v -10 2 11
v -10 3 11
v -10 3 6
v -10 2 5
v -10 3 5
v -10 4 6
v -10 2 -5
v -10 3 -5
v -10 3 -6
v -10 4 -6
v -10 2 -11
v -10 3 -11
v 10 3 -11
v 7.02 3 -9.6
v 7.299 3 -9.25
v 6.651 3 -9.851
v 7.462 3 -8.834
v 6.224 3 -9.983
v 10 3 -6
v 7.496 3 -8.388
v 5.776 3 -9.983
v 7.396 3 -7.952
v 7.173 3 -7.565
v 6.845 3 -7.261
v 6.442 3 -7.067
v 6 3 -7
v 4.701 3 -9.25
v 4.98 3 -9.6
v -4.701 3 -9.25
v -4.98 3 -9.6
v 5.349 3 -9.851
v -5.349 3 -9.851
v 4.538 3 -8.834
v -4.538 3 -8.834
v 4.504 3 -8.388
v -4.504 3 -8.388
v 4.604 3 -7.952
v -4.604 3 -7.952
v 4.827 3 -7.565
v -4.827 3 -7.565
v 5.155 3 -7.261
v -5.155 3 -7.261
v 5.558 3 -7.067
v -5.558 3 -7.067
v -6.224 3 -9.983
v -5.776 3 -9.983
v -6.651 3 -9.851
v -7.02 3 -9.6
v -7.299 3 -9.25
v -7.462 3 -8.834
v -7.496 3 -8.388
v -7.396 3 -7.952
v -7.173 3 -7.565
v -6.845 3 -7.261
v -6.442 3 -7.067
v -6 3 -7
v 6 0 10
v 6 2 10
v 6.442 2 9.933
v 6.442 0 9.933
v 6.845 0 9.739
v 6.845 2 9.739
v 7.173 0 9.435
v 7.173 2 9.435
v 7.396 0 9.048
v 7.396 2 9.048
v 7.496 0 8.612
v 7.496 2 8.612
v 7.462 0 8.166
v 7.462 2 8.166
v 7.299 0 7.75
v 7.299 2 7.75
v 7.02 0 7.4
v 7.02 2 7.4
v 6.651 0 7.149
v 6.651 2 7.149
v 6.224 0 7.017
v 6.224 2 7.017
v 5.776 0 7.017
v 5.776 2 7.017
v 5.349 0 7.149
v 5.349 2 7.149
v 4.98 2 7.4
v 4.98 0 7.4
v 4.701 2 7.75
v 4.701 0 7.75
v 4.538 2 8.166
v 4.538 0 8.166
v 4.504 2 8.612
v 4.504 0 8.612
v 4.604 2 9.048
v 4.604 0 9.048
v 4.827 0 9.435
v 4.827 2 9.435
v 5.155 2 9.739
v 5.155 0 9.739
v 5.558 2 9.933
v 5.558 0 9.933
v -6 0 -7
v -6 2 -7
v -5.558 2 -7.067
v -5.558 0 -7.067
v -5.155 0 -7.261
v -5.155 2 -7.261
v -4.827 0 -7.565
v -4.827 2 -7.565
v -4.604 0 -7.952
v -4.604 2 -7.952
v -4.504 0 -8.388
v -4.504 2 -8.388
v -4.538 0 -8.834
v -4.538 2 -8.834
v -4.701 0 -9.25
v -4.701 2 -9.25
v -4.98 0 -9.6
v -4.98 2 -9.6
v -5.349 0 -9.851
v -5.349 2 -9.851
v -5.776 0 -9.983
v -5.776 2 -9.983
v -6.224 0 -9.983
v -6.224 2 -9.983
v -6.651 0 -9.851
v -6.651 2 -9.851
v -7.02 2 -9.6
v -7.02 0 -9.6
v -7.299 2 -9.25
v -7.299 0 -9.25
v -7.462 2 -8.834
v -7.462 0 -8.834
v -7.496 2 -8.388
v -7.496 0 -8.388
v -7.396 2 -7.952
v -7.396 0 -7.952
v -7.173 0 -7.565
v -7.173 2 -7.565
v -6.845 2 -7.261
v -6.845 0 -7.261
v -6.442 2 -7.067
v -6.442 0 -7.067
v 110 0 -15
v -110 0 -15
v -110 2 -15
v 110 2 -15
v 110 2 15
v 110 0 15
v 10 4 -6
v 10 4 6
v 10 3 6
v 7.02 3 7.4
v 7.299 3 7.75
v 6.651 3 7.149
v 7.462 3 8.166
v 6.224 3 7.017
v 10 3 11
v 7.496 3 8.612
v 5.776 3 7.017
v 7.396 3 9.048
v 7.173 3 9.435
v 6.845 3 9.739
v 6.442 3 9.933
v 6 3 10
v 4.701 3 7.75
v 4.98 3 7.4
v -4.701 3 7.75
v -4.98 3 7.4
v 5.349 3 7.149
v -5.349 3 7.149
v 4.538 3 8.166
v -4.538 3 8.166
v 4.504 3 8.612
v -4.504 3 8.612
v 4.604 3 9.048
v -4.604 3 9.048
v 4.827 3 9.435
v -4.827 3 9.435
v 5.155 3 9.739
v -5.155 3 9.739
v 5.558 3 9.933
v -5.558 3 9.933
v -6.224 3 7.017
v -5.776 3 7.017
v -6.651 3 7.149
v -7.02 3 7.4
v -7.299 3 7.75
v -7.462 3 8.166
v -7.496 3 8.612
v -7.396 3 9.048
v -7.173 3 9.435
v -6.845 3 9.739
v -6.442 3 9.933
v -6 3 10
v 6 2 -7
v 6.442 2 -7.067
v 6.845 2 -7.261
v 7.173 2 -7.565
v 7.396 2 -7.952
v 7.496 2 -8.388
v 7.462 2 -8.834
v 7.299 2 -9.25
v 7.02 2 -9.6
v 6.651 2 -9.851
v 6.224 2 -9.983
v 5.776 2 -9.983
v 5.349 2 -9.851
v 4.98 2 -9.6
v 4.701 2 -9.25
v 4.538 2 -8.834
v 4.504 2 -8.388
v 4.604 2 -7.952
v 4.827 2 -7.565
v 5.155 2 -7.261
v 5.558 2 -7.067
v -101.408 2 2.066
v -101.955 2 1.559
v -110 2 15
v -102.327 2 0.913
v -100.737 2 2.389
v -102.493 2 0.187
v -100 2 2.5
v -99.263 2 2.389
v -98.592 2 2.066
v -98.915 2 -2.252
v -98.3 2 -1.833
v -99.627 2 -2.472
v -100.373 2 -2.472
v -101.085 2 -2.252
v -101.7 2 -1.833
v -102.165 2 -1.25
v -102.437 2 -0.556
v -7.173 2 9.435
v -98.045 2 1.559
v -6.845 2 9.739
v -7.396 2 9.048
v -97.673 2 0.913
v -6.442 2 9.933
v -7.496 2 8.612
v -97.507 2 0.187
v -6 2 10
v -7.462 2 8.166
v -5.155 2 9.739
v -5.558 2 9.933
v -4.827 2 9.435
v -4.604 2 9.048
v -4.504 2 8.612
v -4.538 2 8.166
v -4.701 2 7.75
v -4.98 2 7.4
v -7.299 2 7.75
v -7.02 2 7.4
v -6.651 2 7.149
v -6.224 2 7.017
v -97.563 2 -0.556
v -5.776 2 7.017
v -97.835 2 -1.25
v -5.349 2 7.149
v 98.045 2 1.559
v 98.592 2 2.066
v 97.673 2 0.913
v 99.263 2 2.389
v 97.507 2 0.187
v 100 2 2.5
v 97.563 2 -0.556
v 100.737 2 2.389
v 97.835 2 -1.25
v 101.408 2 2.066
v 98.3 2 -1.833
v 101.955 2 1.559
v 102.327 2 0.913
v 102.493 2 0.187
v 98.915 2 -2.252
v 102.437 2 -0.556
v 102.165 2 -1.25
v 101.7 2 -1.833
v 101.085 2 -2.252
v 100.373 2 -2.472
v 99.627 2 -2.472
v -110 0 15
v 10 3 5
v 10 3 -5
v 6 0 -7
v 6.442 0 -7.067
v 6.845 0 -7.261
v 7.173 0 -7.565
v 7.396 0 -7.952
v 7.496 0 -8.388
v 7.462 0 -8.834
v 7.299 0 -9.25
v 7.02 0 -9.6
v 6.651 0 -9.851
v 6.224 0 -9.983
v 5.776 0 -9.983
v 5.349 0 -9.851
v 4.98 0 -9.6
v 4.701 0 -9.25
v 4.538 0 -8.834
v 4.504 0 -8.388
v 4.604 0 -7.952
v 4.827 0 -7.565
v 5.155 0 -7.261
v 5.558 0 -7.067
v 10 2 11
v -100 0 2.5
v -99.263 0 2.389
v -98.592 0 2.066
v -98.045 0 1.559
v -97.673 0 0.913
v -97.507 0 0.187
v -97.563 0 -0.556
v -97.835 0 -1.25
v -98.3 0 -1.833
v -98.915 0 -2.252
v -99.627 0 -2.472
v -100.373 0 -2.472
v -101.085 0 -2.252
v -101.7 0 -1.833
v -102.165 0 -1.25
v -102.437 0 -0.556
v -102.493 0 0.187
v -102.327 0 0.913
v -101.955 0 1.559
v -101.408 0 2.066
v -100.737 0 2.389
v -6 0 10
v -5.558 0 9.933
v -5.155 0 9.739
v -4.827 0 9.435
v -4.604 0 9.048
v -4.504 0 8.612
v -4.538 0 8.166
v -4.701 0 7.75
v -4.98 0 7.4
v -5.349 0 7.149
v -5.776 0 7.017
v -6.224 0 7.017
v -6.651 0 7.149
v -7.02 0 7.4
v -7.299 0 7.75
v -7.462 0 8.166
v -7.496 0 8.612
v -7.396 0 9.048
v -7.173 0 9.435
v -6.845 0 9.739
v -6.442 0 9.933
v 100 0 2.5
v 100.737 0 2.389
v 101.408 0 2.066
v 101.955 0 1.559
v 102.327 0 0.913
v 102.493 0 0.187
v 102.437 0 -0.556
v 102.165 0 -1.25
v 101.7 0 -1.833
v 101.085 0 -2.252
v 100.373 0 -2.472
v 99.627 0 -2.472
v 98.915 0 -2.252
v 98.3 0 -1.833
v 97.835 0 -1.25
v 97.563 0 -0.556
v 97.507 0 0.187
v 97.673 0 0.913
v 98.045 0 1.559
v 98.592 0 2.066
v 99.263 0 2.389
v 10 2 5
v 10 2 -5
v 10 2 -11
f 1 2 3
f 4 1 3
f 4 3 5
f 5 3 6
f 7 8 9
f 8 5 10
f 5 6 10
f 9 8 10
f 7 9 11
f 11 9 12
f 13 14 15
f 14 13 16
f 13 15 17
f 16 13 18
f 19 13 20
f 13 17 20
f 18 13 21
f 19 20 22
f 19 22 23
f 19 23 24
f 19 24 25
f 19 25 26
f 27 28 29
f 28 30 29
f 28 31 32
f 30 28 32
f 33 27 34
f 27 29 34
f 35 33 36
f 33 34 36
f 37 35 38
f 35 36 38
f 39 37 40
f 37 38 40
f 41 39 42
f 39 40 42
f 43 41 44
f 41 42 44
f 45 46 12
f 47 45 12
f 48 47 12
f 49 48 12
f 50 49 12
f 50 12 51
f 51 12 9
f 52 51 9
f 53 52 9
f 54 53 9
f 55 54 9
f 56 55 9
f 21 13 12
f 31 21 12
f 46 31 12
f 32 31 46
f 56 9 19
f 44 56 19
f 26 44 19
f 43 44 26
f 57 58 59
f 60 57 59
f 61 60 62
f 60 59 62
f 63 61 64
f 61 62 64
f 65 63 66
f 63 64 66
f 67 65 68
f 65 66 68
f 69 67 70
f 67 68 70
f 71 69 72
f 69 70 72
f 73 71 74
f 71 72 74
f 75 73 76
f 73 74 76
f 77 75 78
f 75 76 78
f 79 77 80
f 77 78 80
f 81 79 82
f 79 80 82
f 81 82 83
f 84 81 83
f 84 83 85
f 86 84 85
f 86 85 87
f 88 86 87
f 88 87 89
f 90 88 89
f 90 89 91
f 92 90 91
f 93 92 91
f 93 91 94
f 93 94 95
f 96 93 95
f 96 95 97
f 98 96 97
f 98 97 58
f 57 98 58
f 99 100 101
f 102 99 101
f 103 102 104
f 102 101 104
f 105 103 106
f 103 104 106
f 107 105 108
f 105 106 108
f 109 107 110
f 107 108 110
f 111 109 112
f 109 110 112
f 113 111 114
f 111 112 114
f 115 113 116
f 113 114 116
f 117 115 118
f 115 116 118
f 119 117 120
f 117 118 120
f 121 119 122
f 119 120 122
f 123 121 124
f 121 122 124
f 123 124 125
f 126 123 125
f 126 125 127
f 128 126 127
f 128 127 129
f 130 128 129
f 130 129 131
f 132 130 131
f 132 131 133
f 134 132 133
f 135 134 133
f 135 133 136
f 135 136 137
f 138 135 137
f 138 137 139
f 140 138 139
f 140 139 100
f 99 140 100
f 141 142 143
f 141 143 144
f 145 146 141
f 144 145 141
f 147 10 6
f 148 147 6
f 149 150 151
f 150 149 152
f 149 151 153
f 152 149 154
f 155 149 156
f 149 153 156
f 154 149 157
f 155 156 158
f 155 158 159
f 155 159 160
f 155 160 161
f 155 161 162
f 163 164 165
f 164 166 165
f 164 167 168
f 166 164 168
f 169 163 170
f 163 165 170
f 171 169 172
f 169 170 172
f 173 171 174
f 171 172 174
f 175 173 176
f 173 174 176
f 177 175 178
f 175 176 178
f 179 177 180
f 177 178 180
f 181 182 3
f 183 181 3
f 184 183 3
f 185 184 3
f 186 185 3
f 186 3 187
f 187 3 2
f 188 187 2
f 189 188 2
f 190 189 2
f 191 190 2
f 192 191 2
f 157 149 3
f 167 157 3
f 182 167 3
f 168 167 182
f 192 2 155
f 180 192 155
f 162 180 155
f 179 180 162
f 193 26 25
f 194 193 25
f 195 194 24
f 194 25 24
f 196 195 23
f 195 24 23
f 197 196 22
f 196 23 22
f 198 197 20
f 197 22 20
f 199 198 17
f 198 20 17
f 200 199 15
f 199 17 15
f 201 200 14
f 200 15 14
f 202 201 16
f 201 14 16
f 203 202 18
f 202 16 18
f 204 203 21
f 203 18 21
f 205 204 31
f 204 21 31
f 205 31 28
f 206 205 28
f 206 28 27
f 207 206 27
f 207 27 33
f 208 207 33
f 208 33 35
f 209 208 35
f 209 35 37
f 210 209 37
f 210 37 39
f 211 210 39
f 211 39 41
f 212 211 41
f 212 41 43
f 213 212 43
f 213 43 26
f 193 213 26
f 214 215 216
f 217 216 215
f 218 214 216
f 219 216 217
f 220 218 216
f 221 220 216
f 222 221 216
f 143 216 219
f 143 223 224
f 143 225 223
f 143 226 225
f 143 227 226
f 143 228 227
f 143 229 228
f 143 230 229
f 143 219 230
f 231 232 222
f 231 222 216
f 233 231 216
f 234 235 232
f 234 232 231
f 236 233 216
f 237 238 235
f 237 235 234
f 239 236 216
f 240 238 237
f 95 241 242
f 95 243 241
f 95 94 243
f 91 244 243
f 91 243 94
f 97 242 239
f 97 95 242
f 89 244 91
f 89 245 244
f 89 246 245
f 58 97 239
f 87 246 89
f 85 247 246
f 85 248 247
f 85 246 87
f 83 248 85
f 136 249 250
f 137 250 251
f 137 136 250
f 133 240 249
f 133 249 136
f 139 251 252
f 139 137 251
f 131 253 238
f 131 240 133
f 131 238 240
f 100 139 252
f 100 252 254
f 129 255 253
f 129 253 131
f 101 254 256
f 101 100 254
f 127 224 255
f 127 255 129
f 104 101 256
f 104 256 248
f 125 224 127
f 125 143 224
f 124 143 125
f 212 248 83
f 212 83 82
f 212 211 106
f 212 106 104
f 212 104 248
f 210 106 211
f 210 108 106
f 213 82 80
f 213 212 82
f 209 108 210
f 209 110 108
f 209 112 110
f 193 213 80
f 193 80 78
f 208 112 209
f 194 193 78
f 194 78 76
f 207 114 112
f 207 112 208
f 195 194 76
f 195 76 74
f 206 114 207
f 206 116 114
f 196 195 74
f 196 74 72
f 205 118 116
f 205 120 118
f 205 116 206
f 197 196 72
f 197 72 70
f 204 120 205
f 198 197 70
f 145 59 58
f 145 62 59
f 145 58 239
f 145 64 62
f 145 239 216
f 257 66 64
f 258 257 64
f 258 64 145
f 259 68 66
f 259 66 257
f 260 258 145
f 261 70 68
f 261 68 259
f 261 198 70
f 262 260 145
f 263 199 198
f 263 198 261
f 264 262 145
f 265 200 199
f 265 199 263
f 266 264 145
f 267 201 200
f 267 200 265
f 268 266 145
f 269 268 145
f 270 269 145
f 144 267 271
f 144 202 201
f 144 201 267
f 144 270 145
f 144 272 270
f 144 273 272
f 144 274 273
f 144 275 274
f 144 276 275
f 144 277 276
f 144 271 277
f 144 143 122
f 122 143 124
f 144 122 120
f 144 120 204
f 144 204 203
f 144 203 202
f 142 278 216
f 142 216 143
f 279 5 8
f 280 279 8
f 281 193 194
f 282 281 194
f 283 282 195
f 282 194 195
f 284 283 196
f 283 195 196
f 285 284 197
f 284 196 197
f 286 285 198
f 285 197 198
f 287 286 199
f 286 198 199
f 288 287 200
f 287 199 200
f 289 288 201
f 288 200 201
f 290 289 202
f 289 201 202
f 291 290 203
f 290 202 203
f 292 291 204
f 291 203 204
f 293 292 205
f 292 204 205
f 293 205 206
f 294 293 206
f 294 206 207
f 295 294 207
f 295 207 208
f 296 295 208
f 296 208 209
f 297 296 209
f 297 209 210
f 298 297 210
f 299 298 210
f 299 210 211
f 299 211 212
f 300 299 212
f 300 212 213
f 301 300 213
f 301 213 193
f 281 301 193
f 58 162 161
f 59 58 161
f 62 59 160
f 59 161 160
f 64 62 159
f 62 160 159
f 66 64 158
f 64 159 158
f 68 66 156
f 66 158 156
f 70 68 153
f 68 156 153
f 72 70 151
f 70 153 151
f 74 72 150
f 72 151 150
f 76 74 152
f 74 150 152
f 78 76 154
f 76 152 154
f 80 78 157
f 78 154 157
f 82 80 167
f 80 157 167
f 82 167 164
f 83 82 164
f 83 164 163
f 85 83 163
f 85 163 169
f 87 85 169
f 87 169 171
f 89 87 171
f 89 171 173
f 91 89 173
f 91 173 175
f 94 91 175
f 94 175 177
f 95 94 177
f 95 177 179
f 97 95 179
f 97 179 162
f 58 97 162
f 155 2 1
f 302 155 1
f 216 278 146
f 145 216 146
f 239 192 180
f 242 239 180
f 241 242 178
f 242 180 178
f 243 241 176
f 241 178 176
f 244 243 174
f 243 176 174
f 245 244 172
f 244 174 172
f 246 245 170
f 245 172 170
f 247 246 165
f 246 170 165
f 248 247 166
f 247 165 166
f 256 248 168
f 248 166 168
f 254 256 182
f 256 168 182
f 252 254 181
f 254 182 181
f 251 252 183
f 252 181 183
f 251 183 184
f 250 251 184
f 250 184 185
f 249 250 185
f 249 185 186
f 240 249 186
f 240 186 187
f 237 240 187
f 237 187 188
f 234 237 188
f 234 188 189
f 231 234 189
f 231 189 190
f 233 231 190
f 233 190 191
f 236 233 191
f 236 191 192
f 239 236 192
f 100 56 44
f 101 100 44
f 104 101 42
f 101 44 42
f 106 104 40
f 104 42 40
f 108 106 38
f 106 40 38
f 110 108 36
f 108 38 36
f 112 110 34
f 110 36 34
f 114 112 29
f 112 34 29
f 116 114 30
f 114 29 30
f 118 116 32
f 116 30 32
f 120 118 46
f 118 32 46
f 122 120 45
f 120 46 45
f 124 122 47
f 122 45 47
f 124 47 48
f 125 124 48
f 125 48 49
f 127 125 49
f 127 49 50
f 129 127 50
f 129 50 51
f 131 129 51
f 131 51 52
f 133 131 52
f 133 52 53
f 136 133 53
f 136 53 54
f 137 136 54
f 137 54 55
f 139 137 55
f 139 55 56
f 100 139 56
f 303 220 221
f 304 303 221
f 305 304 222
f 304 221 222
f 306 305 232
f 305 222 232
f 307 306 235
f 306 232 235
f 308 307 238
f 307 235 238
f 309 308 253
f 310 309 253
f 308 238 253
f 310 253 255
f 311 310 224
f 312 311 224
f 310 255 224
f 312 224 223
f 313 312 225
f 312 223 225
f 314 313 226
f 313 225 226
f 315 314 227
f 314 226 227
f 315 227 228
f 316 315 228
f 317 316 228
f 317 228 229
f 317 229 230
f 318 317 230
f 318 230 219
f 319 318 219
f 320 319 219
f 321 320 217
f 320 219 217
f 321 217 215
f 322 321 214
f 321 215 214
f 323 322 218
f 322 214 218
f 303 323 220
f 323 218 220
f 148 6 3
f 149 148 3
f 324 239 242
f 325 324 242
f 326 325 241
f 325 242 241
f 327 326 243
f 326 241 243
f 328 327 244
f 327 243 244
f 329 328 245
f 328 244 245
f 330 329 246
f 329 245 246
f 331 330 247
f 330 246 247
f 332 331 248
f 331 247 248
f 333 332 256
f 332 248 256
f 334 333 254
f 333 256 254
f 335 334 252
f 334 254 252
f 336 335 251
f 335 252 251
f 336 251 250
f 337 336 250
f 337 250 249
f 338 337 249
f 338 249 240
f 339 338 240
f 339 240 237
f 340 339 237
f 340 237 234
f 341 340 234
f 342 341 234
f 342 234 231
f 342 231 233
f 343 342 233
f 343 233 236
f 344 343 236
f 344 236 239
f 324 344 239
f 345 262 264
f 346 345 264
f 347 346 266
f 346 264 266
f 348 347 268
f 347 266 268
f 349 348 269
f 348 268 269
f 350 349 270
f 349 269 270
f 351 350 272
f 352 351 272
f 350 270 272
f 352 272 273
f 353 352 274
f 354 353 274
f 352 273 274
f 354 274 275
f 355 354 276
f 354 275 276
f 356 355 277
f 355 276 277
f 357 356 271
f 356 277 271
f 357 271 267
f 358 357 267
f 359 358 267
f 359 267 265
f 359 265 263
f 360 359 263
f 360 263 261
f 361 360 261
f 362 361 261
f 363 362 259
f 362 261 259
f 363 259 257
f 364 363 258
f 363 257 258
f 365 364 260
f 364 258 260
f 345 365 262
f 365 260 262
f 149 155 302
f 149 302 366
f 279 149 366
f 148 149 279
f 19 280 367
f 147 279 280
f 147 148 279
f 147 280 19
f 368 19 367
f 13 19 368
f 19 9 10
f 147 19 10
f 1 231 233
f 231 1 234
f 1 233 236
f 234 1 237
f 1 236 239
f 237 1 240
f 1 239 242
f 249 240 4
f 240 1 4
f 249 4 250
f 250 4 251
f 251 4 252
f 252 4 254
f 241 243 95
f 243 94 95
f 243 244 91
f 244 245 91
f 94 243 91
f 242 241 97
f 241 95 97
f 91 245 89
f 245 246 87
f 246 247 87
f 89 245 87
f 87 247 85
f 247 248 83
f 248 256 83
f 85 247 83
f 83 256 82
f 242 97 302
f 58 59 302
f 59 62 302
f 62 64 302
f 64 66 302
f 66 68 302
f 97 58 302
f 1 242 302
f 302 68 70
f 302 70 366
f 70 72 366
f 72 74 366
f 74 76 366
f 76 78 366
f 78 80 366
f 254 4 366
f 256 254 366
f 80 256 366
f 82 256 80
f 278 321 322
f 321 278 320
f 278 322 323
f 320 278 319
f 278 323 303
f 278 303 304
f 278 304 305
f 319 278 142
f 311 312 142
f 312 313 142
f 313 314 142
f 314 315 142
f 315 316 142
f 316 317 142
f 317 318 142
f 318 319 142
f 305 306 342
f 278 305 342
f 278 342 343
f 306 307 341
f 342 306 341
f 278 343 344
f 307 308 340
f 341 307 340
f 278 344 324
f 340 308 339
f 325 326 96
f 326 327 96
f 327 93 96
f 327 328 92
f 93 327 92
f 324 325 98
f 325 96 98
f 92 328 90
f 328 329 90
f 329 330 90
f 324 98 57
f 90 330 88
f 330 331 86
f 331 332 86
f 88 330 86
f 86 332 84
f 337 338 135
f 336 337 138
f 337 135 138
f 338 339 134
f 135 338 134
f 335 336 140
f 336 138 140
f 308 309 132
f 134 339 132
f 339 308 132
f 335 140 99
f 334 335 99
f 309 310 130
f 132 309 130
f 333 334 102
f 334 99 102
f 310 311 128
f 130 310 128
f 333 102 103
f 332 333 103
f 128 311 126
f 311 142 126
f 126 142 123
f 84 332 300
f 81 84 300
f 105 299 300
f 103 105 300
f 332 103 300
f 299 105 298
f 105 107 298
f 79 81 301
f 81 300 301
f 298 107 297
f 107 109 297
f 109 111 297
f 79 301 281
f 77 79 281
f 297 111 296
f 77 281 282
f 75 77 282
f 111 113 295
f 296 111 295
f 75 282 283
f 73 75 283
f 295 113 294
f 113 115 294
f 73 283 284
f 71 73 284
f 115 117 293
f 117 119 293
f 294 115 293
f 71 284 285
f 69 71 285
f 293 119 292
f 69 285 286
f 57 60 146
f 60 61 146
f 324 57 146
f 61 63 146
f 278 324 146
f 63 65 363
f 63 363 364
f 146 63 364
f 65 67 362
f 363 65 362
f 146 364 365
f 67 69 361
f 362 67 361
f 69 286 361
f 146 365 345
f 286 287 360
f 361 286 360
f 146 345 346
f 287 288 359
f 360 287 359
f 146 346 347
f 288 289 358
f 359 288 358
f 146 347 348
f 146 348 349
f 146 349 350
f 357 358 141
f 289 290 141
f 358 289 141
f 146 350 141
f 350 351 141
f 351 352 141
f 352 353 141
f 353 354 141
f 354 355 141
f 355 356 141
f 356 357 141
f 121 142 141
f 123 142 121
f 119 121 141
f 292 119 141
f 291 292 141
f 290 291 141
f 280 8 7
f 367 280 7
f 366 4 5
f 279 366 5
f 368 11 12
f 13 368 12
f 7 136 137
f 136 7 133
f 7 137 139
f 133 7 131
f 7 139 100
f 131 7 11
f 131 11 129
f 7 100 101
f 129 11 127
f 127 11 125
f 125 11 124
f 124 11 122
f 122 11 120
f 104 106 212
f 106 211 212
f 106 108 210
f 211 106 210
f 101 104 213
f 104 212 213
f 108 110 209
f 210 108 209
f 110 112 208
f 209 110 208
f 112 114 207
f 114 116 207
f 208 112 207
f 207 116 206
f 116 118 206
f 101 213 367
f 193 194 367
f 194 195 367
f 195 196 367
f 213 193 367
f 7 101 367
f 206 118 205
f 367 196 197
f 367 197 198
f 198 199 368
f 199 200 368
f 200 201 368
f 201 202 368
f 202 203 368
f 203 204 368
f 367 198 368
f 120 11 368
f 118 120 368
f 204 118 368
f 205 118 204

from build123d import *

# Parameters (mm, degrees)
SKETCH_1_W          = 220
SKETCH_1_H          = 30
EXTRUDE_1_DEPTH     = 2
EXTRUDE_START       = -10
EXTRUDE_1_2_DEPTH   = 20
SKETCH_3_R          = 1.5
CUT_EXTRUDE_1_DEPTH = 3
SKETCH_4_R          = 2.5
CUT_EXTRUDE_2_DEPTH = 2


# Read off the part's stored shape, not the designer's step: 拉伸-薄壁1, 分割1
with BuildPart() as part:
    # 草图1 → Extrude 1 (new body)
    with BuildSketch(Plane(origin=(0, 0, 0), x_dir=(1, 0, 0), z_dir=(0, 1, 0))):
        Rectangle(SKETCH_1_W, SKETCH_1_H)
    extrude(amount=EXTRUDE_1_DEPTH)

    # Extrude 1 2 outline → Extrude 1 2 (add)
    with BuildSketch(Plane(origin=(0, 0, 0), x_dir=(0, 0, -1), z_dir=(1, 0, 0)).offset(EXTRUDE_START)):
        Polygon((-11, 3), (-11, 2), (-5, 2), (-5, 3), (5, 3), (5, 2), (11, 2), (11, 3), (6, 3), (6, 4), (-6, 4), (-6, 3), align=None)
    extrude(amount=EXTRUDE_1_2_DEPTH)

    # 草图3 → 切除-拉伸1 (cut)
    with BuildSketch(Plane(origin=(0, 3, 0), x_dir=(1, 0, 0), z_dir=(0, 1, 0))):
        with Locations(Location((-6, 8.5, 0), (0, 0, 270))):
            Circle(SKETCH_3_R)
        with Locations(Location((6, 8.5, 0), (0, 0, 270))):
            Circle(SKETCH_3_R)
        with Locations(Location((-6, -8.5, 0), (0, 0, 270))):
            Circle(SKETCH_3_R)
        with Locations(Location((6, -8.5, 0), (0, 0, 270))):
            Circle(SKETCH_3_R)
    extrude(amount=-CUT_EXTRUDE_1_DEPTH, mode=Mode.SUBTRACT)


with BuildPart() as body_2:
    # Split Bodies 1: the piece on the far side of the plane
    add(part.part)
    split(bisect_by=Plane(origin=(0, 2, 0), x_dir=(1, 0, 0), z_dir=(0, 1, 0)), keep=Keep.BOTTOM)

    # 草图4 → 切除-拉伸2 (cut)
    with BuildSketch(Plane(origin=(0, 2, 0), x_dir=(1, 0, 0), z_dir=(0, 1, 0))):
        with Locations(Location((-100, 0, 0), (0, 0, 270))):
            Circle(SKETCH_4_R)
        with Locations(Location((100, 0, 0), (0, 0, 270))):
            Circle(SKETCH_4_R)
    extrude(amount=-CUT_EXTRUDE_2_DEPTH, mode=Mode.SUBTRACT)


with BuildPart() as part_1:
    add(part.part)

    # Split Bodies 1
    split(bisect_by=Plane(origin=(0, 2, 0), x_dir=(1, 0, 0), z_dir=(0, 1, 0)), keep=Keep.TOP)


solid = Compound([body_2.part, part_1.part])
